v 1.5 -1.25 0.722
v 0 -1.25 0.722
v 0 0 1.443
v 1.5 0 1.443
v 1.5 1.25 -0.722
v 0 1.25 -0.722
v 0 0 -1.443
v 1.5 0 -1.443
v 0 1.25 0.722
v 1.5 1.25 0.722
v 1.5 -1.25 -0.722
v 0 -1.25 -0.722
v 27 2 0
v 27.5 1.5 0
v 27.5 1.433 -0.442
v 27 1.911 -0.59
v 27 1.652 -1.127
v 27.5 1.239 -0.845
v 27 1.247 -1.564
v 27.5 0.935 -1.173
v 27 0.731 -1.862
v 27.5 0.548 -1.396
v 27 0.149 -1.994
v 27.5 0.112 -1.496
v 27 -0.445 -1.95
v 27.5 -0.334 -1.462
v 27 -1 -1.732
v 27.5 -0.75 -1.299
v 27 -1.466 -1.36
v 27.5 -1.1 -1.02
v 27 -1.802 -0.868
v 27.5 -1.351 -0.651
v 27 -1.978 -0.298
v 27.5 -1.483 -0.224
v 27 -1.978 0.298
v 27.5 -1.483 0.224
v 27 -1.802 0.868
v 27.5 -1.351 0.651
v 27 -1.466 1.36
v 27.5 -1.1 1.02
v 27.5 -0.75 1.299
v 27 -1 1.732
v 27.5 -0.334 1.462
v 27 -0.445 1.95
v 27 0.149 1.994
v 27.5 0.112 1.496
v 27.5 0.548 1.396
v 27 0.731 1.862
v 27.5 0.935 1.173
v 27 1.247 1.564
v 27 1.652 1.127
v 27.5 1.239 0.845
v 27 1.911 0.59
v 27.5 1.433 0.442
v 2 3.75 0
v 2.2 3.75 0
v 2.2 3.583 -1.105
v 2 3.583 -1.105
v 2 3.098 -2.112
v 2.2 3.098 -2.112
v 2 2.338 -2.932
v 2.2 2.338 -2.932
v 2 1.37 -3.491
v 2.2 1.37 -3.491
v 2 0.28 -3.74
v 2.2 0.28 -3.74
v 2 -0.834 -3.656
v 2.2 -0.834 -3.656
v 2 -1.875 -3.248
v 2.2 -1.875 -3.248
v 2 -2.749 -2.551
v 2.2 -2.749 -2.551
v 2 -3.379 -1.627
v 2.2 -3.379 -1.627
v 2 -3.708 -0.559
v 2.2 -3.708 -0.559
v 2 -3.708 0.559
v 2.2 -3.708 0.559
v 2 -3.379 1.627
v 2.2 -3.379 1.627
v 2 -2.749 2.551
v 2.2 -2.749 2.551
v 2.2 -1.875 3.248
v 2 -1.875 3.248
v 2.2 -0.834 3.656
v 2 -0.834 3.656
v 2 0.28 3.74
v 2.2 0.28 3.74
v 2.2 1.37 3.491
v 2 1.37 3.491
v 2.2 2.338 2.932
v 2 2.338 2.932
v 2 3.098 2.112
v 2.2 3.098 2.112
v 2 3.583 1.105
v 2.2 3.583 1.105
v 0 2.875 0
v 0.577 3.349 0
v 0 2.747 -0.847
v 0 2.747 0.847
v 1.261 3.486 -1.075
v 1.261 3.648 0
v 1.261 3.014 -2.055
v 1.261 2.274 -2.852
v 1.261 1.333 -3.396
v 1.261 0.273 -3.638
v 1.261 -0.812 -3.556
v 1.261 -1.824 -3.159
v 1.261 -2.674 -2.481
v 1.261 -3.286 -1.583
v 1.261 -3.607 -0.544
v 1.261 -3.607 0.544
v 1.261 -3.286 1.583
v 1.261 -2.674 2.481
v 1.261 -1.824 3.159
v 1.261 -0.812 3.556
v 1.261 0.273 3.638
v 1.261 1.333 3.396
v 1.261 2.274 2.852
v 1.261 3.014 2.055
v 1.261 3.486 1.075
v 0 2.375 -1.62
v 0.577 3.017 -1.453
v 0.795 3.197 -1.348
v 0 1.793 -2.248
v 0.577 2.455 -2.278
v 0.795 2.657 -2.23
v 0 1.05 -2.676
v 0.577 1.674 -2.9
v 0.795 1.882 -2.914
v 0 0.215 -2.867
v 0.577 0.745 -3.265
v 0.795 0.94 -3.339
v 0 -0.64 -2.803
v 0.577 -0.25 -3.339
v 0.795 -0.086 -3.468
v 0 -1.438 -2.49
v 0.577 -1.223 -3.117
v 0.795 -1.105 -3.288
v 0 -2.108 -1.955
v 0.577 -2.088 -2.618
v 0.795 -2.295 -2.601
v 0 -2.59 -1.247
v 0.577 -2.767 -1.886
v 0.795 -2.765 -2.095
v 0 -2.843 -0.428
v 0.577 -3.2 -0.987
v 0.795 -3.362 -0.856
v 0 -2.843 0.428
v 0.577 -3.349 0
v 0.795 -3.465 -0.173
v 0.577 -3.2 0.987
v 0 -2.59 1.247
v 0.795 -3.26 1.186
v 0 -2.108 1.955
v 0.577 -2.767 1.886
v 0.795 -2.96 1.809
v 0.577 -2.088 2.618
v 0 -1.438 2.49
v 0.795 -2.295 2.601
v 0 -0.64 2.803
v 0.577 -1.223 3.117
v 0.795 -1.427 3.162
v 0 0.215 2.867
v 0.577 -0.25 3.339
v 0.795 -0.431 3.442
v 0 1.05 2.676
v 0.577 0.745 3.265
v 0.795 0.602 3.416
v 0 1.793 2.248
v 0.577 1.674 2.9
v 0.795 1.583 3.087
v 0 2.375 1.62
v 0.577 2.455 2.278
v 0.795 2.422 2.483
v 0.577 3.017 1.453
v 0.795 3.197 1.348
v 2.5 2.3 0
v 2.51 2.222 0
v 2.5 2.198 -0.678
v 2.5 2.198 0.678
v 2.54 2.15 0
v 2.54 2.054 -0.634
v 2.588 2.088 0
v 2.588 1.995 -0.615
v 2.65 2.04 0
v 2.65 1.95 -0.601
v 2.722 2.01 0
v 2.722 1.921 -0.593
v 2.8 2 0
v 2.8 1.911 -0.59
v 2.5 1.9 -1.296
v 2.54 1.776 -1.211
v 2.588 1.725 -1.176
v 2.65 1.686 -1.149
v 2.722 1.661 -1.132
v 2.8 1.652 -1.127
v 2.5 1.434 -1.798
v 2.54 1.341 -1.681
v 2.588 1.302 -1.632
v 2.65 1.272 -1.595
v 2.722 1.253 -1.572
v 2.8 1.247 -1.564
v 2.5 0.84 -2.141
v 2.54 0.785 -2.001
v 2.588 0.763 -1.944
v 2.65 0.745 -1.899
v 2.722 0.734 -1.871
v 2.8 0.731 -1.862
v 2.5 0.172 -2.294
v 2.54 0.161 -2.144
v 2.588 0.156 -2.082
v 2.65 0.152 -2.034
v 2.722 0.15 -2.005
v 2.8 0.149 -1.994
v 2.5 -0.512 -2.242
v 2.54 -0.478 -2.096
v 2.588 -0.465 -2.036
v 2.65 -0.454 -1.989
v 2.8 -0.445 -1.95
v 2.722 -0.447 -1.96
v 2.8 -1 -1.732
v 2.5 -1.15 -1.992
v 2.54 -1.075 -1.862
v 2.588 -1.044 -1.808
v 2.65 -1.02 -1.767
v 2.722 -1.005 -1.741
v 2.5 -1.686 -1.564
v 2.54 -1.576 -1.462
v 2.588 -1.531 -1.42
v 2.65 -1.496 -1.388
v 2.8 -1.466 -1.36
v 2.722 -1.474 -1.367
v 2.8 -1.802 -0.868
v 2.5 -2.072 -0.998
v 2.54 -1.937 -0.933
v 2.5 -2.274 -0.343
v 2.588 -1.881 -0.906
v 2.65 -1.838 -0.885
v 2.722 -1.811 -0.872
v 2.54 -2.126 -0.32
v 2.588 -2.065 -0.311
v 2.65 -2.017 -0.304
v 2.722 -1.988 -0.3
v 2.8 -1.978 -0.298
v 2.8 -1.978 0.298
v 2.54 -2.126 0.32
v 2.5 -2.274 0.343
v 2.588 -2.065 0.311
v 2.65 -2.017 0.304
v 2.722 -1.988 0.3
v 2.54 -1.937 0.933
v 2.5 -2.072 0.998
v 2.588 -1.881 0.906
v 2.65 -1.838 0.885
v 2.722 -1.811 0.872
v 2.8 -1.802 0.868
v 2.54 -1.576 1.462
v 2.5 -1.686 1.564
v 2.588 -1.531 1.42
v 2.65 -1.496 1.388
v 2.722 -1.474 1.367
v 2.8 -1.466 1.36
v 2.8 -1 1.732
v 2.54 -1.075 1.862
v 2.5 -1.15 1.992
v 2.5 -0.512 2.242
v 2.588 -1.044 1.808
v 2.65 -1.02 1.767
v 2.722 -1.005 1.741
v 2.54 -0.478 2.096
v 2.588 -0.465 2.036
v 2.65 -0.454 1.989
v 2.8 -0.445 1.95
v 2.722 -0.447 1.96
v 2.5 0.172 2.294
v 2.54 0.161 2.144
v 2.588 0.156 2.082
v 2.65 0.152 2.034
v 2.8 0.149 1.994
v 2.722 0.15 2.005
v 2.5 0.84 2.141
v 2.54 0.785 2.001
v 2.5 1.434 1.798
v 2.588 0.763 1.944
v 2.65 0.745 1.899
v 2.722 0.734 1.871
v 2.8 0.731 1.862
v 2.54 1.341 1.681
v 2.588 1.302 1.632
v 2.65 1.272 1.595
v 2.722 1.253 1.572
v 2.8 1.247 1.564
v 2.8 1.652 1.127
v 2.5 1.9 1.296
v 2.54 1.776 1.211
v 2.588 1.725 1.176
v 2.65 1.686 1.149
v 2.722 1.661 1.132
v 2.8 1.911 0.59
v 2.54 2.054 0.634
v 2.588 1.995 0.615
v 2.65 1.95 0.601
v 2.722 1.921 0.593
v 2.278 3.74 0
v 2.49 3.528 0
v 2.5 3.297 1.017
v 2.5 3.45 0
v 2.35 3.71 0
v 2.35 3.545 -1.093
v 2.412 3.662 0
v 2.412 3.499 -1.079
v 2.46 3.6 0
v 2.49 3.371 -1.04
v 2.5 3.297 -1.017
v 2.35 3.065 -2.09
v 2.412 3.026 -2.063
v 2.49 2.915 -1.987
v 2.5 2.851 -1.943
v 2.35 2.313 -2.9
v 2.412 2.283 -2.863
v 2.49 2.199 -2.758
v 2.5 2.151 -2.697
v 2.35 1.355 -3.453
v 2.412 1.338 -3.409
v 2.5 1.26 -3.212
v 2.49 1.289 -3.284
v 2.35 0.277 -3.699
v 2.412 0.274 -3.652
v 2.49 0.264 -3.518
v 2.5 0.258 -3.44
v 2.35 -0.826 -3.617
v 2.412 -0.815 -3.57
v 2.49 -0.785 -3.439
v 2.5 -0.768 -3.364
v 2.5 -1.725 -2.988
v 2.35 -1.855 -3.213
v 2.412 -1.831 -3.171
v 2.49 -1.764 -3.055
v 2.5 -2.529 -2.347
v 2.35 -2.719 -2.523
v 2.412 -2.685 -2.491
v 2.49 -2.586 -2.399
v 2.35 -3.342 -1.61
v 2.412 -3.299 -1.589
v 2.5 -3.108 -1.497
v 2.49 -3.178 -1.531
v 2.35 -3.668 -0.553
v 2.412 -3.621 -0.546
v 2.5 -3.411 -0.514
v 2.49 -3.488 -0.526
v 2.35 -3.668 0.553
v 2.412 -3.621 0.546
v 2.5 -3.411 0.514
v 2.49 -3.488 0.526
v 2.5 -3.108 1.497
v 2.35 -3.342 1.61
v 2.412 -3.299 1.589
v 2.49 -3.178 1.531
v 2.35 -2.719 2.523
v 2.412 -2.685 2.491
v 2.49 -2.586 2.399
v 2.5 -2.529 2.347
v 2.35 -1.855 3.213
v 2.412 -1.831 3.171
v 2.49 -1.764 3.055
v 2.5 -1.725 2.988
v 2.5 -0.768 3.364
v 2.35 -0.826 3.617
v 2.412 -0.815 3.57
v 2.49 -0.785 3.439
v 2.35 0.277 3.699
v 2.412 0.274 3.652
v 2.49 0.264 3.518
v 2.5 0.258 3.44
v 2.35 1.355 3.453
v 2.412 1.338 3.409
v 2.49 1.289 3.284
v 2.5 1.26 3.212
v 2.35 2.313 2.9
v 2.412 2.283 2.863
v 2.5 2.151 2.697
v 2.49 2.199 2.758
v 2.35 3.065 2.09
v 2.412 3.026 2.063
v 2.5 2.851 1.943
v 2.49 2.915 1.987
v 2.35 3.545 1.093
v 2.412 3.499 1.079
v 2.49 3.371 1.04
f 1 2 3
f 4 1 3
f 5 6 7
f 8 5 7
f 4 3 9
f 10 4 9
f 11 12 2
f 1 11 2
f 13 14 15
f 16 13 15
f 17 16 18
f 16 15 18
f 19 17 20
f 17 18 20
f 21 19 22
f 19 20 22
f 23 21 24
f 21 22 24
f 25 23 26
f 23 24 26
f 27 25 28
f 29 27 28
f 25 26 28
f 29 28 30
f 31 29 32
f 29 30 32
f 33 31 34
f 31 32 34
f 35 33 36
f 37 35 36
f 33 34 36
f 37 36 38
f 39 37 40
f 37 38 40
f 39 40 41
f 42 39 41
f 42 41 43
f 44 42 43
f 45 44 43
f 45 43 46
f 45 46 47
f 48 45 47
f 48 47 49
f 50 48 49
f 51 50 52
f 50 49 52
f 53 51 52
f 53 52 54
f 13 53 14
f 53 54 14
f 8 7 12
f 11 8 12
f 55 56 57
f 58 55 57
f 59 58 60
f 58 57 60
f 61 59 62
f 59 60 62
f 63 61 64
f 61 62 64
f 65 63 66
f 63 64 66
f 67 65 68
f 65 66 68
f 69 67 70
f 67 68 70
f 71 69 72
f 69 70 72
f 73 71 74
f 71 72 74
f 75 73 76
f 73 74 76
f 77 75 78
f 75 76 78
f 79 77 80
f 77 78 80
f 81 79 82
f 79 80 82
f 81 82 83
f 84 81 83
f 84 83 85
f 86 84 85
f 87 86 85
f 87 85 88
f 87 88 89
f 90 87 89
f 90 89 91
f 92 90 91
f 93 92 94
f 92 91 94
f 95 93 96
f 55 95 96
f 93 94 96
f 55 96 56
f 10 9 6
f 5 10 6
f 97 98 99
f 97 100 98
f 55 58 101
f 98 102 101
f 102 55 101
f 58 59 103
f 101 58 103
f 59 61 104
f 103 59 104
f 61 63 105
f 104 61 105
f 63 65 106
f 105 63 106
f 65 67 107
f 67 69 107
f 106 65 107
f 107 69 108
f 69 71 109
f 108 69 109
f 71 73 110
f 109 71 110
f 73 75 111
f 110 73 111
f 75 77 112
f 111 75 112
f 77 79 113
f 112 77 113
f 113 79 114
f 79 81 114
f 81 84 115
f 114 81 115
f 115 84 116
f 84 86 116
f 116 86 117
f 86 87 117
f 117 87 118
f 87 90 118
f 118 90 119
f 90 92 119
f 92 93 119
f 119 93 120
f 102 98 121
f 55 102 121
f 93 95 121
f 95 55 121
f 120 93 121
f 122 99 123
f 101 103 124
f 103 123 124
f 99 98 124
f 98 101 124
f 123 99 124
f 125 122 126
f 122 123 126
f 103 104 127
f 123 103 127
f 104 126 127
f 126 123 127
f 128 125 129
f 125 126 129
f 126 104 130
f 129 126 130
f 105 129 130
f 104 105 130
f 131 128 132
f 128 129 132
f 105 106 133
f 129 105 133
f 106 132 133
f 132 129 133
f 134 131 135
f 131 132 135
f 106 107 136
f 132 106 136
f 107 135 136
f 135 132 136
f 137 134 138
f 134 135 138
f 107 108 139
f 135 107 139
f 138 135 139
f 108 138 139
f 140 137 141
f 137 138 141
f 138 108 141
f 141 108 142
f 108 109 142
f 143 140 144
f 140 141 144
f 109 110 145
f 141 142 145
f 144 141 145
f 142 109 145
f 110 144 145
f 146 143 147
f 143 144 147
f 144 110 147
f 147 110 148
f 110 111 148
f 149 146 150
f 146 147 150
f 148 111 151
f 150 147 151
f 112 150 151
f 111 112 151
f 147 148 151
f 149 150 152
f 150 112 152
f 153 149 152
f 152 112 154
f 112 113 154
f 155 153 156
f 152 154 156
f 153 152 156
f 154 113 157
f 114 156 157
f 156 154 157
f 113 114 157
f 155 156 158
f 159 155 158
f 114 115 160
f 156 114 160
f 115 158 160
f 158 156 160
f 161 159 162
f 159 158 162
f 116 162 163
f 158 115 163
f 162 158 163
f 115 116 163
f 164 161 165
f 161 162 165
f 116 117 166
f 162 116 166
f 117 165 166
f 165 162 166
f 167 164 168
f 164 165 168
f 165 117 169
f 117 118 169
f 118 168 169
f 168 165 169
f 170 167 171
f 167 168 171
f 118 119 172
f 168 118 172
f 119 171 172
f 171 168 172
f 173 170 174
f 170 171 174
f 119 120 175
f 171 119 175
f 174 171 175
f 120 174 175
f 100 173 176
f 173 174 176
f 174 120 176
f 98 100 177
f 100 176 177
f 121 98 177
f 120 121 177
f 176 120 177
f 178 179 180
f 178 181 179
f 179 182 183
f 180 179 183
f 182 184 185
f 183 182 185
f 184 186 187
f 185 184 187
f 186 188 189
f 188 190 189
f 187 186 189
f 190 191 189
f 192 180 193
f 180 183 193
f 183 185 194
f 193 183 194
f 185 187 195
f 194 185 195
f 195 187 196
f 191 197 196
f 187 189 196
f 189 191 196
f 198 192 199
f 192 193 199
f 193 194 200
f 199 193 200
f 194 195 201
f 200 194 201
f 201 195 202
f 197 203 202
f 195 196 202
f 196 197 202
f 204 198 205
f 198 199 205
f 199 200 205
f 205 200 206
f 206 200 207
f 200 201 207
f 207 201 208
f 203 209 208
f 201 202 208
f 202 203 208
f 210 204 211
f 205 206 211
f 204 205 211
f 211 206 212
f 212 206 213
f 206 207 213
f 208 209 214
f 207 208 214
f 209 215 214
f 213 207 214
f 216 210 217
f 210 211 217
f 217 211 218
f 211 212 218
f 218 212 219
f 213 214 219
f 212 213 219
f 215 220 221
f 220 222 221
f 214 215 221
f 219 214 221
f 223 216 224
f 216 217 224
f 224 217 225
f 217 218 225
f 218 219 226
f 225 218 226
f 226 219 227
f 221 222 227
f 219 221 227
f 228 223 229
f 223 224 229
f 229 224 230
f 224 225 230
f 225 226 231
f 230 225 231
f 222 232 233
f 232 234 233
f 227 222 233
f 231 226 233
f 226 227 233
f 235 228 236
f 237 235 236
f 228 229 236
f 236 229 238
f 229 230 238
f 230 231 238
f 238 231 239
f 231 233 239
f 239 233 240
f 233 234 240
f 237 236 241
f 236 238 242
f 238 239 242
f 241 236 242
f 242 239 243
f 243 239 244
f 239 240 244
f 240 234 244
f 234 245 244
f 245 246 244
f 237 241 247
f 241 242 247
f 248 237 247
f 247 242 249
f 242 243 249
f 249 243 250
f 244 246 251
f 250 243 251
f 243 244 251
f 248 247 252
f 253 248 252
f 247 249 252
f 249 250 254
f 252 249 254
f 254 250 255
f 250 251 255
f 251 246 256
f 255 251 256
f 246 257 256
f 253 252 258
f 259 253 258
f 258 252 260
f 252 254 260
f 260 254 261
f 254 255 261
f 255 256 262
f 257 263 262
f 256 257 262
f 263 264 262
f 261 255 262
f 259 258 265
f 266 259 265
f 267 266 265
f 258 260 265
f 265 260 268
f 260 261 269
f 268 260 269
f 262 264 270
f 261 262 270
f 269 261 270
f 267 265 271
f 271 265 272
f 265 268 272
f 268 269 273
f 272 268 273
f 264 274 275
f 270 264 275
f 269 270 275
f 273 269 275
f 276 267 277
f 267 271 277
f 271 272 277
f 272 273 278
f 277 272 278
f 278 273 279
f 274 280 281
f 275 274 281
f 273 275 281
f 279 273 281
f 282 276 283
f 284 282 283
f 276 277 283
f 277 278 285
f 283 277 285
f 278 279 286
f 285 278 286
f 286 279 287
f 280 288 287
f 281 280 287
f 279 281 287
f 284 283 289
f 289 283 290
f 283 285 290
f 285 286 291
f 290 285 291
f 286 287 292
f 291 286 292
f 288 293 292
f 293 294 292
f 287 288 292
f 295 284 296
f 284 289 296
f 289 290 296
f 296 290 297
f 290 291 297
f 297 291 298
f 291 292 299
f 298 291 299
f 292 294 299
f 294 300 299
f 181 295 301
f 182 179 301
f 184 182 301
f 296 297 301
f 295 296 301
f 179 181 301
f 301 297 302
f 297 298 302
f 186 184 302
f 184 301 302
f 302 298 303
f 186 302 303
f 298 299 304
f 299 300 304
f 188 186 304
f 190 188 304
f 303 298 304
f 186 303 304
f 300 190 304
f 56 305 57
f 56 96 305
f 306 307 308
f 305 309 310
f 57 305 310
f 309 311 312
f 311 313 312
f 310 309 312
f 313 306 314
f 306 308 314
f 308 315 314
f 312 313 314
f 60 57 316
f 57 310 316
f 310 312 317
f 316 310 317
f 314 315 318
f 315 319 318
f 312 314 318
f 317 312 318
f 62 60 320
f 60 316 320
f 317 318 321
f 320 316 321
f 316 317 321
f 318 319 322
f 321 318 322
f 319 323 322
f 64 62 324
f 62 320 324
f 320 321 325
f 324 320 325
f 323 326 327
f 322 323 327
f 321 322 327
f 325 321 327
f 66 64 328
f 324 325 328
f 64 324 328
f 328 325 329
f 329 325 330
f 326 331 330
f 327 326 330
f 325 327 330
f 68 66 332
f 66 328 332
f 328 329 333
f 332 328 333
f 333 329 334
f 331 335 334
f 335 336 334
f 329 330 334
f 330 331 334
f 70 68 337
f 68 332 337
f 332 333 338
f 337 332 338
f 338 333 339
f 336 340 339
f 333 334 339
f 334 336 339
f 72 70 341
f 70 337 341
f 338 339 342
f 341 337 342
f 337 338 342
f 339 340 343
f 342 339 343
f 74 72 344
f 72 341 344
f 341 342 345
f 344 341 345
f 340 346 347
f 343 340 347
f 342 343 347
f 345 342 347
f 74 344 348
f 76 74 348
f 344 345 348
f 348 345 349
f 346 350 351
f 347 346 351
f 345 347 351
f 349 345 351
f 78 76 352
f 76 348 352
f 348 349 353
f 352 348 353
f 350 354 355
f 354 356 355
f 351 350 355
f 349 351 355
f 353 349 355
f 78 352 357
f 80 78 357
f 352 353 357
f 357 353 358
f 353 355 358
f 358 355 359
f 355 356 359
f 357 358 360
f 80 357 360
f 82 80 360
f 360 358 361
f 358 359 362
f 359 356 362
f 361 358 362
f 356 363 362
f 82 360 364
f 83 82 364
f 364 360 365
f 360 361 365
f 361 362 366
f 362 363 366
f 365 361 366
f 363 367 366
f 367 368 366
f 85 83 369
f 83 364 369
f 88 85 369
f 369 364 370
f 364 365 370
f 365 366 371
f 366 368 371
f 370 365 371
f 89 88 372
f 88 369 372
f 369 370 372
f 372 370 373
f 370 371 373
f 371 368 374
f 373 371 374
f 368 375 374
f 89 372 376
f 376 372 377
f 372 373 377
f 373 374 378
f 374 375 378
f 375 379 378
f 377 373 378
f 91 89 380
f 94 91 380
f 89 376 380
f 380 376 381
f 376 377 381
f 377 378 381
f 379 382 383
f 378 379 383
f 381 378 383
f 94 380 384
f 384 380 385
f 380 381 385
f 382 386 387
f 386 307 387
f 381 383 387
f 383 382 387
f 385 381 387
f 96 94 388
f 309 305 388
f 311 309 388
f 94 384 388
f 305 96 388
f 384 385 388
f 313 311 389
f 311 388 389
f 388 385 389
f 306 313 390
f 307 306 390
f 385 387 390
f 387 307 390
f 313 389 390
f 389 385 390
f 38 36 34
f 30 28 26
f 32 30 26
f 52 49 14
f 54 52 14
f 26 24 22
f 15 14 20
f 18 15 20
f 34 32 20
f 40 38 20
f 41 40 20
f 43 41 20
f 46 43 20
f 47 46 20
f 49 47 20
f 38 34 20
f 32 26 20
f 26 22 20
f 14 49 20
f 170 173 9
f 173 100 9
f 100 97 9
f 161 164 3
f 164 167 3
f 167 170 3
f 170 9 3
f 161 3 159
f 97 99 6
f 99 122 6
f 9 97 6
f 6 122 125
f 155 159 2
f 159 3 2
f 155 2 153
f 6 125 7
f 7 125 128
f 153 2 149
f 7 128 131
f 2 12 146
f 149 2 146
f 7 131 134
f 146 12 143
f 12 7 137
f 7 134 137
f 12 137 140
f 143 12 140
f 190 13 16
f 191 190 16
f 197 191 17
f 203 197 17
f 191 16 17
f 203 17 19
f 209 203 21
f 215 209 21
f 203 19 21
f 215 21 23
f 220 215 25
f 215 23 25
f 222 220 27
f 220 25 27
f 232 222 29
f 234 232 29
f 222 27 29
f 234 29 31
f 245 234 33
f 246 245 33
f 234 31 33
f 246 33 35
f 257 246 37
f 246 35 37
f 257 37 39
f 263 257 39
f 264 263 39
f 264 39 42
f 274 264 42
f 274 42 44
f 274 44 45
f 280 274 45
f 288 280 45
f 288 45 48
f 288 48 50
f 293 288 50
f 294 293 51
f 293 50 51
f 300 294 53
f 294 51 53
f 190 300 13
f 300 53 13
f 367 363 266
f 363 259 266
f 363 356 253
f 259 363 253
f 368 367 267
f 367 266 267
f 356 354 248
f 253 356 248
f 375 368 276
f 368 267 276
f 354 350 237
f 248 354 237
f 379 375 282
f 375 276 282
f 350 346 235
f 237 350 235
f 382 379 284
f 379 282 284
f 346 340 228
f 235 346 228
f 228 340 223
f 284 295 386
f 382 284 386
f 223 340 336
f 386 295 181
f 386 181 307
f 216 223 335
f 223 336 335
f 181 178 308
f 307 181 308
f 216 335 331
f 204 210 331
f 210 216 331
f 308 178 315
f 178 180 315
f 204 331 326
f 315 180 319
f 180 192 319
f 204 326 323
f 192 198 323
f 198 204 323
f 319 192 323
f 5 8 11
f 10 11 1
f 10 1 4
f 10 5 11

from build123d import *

# Parameters (mm, degrees)
CUT_EXTRUDE_1_DEPTH = 1.5
FILLET_1_R          = 0.3
CHAMFER_1_SIZE      = 0.5


with BuildPart() as part:
    # Эскиз1 → Повернуть1 (revolve)
    with BuildSketch(Plane.XY):
        with BuildLine():
            Line((0, 0), (0, 2.875))
            ThreePointArc((0, 2.875), (0.908484425, 3.521678457), (2, 3.75))
            Line((2, 3.75), (2.5, 3.75))
            Line((2.5, 3.75), (2.5, 2))
            Line((2.5, 2), (27.5, 2))
            Line((27.5, 2), (27.5, 0))
            Line((27.5, 0), (0, 0))
        make_face()
    revolve(axis=Axis((27.5, 0, 0), (-1, 0, 0)))

    # Эскиз2 → Вырез-Вытянуть1 (cut)
    with BuildSketch(Plane.ZY):
        Polygon((0.721687836, 1.25), (-0.721687836, 1.25), (-1.443375673, 0), (-0.721687836, -1.25), (0.721687836, -1.25), (1.443375673, 0), align=None)
    extrude(amount=-CUT_EXTRUDE_1_DEPTH, mode=Mode.SUBTRACT)

    # Скругление1
    fillet_1_edges = [part.edges().sort_by_distance(p)[0] for p in [
        (2.5, -2, 0),
        (2.5, -3.75, 0),
    ]]
    fillet(fillet_1_edges, radius=FILLET_1_R)

    # Фаска1
    chamfer_1_edges = [part.edges().sort_by_distance(p)[0] for p in [
        (27.5, -2, 0),
    ]]
    chamfer(chamfer_1_edges, length=CHAMFER_1_SIZE)


solid = part.part
